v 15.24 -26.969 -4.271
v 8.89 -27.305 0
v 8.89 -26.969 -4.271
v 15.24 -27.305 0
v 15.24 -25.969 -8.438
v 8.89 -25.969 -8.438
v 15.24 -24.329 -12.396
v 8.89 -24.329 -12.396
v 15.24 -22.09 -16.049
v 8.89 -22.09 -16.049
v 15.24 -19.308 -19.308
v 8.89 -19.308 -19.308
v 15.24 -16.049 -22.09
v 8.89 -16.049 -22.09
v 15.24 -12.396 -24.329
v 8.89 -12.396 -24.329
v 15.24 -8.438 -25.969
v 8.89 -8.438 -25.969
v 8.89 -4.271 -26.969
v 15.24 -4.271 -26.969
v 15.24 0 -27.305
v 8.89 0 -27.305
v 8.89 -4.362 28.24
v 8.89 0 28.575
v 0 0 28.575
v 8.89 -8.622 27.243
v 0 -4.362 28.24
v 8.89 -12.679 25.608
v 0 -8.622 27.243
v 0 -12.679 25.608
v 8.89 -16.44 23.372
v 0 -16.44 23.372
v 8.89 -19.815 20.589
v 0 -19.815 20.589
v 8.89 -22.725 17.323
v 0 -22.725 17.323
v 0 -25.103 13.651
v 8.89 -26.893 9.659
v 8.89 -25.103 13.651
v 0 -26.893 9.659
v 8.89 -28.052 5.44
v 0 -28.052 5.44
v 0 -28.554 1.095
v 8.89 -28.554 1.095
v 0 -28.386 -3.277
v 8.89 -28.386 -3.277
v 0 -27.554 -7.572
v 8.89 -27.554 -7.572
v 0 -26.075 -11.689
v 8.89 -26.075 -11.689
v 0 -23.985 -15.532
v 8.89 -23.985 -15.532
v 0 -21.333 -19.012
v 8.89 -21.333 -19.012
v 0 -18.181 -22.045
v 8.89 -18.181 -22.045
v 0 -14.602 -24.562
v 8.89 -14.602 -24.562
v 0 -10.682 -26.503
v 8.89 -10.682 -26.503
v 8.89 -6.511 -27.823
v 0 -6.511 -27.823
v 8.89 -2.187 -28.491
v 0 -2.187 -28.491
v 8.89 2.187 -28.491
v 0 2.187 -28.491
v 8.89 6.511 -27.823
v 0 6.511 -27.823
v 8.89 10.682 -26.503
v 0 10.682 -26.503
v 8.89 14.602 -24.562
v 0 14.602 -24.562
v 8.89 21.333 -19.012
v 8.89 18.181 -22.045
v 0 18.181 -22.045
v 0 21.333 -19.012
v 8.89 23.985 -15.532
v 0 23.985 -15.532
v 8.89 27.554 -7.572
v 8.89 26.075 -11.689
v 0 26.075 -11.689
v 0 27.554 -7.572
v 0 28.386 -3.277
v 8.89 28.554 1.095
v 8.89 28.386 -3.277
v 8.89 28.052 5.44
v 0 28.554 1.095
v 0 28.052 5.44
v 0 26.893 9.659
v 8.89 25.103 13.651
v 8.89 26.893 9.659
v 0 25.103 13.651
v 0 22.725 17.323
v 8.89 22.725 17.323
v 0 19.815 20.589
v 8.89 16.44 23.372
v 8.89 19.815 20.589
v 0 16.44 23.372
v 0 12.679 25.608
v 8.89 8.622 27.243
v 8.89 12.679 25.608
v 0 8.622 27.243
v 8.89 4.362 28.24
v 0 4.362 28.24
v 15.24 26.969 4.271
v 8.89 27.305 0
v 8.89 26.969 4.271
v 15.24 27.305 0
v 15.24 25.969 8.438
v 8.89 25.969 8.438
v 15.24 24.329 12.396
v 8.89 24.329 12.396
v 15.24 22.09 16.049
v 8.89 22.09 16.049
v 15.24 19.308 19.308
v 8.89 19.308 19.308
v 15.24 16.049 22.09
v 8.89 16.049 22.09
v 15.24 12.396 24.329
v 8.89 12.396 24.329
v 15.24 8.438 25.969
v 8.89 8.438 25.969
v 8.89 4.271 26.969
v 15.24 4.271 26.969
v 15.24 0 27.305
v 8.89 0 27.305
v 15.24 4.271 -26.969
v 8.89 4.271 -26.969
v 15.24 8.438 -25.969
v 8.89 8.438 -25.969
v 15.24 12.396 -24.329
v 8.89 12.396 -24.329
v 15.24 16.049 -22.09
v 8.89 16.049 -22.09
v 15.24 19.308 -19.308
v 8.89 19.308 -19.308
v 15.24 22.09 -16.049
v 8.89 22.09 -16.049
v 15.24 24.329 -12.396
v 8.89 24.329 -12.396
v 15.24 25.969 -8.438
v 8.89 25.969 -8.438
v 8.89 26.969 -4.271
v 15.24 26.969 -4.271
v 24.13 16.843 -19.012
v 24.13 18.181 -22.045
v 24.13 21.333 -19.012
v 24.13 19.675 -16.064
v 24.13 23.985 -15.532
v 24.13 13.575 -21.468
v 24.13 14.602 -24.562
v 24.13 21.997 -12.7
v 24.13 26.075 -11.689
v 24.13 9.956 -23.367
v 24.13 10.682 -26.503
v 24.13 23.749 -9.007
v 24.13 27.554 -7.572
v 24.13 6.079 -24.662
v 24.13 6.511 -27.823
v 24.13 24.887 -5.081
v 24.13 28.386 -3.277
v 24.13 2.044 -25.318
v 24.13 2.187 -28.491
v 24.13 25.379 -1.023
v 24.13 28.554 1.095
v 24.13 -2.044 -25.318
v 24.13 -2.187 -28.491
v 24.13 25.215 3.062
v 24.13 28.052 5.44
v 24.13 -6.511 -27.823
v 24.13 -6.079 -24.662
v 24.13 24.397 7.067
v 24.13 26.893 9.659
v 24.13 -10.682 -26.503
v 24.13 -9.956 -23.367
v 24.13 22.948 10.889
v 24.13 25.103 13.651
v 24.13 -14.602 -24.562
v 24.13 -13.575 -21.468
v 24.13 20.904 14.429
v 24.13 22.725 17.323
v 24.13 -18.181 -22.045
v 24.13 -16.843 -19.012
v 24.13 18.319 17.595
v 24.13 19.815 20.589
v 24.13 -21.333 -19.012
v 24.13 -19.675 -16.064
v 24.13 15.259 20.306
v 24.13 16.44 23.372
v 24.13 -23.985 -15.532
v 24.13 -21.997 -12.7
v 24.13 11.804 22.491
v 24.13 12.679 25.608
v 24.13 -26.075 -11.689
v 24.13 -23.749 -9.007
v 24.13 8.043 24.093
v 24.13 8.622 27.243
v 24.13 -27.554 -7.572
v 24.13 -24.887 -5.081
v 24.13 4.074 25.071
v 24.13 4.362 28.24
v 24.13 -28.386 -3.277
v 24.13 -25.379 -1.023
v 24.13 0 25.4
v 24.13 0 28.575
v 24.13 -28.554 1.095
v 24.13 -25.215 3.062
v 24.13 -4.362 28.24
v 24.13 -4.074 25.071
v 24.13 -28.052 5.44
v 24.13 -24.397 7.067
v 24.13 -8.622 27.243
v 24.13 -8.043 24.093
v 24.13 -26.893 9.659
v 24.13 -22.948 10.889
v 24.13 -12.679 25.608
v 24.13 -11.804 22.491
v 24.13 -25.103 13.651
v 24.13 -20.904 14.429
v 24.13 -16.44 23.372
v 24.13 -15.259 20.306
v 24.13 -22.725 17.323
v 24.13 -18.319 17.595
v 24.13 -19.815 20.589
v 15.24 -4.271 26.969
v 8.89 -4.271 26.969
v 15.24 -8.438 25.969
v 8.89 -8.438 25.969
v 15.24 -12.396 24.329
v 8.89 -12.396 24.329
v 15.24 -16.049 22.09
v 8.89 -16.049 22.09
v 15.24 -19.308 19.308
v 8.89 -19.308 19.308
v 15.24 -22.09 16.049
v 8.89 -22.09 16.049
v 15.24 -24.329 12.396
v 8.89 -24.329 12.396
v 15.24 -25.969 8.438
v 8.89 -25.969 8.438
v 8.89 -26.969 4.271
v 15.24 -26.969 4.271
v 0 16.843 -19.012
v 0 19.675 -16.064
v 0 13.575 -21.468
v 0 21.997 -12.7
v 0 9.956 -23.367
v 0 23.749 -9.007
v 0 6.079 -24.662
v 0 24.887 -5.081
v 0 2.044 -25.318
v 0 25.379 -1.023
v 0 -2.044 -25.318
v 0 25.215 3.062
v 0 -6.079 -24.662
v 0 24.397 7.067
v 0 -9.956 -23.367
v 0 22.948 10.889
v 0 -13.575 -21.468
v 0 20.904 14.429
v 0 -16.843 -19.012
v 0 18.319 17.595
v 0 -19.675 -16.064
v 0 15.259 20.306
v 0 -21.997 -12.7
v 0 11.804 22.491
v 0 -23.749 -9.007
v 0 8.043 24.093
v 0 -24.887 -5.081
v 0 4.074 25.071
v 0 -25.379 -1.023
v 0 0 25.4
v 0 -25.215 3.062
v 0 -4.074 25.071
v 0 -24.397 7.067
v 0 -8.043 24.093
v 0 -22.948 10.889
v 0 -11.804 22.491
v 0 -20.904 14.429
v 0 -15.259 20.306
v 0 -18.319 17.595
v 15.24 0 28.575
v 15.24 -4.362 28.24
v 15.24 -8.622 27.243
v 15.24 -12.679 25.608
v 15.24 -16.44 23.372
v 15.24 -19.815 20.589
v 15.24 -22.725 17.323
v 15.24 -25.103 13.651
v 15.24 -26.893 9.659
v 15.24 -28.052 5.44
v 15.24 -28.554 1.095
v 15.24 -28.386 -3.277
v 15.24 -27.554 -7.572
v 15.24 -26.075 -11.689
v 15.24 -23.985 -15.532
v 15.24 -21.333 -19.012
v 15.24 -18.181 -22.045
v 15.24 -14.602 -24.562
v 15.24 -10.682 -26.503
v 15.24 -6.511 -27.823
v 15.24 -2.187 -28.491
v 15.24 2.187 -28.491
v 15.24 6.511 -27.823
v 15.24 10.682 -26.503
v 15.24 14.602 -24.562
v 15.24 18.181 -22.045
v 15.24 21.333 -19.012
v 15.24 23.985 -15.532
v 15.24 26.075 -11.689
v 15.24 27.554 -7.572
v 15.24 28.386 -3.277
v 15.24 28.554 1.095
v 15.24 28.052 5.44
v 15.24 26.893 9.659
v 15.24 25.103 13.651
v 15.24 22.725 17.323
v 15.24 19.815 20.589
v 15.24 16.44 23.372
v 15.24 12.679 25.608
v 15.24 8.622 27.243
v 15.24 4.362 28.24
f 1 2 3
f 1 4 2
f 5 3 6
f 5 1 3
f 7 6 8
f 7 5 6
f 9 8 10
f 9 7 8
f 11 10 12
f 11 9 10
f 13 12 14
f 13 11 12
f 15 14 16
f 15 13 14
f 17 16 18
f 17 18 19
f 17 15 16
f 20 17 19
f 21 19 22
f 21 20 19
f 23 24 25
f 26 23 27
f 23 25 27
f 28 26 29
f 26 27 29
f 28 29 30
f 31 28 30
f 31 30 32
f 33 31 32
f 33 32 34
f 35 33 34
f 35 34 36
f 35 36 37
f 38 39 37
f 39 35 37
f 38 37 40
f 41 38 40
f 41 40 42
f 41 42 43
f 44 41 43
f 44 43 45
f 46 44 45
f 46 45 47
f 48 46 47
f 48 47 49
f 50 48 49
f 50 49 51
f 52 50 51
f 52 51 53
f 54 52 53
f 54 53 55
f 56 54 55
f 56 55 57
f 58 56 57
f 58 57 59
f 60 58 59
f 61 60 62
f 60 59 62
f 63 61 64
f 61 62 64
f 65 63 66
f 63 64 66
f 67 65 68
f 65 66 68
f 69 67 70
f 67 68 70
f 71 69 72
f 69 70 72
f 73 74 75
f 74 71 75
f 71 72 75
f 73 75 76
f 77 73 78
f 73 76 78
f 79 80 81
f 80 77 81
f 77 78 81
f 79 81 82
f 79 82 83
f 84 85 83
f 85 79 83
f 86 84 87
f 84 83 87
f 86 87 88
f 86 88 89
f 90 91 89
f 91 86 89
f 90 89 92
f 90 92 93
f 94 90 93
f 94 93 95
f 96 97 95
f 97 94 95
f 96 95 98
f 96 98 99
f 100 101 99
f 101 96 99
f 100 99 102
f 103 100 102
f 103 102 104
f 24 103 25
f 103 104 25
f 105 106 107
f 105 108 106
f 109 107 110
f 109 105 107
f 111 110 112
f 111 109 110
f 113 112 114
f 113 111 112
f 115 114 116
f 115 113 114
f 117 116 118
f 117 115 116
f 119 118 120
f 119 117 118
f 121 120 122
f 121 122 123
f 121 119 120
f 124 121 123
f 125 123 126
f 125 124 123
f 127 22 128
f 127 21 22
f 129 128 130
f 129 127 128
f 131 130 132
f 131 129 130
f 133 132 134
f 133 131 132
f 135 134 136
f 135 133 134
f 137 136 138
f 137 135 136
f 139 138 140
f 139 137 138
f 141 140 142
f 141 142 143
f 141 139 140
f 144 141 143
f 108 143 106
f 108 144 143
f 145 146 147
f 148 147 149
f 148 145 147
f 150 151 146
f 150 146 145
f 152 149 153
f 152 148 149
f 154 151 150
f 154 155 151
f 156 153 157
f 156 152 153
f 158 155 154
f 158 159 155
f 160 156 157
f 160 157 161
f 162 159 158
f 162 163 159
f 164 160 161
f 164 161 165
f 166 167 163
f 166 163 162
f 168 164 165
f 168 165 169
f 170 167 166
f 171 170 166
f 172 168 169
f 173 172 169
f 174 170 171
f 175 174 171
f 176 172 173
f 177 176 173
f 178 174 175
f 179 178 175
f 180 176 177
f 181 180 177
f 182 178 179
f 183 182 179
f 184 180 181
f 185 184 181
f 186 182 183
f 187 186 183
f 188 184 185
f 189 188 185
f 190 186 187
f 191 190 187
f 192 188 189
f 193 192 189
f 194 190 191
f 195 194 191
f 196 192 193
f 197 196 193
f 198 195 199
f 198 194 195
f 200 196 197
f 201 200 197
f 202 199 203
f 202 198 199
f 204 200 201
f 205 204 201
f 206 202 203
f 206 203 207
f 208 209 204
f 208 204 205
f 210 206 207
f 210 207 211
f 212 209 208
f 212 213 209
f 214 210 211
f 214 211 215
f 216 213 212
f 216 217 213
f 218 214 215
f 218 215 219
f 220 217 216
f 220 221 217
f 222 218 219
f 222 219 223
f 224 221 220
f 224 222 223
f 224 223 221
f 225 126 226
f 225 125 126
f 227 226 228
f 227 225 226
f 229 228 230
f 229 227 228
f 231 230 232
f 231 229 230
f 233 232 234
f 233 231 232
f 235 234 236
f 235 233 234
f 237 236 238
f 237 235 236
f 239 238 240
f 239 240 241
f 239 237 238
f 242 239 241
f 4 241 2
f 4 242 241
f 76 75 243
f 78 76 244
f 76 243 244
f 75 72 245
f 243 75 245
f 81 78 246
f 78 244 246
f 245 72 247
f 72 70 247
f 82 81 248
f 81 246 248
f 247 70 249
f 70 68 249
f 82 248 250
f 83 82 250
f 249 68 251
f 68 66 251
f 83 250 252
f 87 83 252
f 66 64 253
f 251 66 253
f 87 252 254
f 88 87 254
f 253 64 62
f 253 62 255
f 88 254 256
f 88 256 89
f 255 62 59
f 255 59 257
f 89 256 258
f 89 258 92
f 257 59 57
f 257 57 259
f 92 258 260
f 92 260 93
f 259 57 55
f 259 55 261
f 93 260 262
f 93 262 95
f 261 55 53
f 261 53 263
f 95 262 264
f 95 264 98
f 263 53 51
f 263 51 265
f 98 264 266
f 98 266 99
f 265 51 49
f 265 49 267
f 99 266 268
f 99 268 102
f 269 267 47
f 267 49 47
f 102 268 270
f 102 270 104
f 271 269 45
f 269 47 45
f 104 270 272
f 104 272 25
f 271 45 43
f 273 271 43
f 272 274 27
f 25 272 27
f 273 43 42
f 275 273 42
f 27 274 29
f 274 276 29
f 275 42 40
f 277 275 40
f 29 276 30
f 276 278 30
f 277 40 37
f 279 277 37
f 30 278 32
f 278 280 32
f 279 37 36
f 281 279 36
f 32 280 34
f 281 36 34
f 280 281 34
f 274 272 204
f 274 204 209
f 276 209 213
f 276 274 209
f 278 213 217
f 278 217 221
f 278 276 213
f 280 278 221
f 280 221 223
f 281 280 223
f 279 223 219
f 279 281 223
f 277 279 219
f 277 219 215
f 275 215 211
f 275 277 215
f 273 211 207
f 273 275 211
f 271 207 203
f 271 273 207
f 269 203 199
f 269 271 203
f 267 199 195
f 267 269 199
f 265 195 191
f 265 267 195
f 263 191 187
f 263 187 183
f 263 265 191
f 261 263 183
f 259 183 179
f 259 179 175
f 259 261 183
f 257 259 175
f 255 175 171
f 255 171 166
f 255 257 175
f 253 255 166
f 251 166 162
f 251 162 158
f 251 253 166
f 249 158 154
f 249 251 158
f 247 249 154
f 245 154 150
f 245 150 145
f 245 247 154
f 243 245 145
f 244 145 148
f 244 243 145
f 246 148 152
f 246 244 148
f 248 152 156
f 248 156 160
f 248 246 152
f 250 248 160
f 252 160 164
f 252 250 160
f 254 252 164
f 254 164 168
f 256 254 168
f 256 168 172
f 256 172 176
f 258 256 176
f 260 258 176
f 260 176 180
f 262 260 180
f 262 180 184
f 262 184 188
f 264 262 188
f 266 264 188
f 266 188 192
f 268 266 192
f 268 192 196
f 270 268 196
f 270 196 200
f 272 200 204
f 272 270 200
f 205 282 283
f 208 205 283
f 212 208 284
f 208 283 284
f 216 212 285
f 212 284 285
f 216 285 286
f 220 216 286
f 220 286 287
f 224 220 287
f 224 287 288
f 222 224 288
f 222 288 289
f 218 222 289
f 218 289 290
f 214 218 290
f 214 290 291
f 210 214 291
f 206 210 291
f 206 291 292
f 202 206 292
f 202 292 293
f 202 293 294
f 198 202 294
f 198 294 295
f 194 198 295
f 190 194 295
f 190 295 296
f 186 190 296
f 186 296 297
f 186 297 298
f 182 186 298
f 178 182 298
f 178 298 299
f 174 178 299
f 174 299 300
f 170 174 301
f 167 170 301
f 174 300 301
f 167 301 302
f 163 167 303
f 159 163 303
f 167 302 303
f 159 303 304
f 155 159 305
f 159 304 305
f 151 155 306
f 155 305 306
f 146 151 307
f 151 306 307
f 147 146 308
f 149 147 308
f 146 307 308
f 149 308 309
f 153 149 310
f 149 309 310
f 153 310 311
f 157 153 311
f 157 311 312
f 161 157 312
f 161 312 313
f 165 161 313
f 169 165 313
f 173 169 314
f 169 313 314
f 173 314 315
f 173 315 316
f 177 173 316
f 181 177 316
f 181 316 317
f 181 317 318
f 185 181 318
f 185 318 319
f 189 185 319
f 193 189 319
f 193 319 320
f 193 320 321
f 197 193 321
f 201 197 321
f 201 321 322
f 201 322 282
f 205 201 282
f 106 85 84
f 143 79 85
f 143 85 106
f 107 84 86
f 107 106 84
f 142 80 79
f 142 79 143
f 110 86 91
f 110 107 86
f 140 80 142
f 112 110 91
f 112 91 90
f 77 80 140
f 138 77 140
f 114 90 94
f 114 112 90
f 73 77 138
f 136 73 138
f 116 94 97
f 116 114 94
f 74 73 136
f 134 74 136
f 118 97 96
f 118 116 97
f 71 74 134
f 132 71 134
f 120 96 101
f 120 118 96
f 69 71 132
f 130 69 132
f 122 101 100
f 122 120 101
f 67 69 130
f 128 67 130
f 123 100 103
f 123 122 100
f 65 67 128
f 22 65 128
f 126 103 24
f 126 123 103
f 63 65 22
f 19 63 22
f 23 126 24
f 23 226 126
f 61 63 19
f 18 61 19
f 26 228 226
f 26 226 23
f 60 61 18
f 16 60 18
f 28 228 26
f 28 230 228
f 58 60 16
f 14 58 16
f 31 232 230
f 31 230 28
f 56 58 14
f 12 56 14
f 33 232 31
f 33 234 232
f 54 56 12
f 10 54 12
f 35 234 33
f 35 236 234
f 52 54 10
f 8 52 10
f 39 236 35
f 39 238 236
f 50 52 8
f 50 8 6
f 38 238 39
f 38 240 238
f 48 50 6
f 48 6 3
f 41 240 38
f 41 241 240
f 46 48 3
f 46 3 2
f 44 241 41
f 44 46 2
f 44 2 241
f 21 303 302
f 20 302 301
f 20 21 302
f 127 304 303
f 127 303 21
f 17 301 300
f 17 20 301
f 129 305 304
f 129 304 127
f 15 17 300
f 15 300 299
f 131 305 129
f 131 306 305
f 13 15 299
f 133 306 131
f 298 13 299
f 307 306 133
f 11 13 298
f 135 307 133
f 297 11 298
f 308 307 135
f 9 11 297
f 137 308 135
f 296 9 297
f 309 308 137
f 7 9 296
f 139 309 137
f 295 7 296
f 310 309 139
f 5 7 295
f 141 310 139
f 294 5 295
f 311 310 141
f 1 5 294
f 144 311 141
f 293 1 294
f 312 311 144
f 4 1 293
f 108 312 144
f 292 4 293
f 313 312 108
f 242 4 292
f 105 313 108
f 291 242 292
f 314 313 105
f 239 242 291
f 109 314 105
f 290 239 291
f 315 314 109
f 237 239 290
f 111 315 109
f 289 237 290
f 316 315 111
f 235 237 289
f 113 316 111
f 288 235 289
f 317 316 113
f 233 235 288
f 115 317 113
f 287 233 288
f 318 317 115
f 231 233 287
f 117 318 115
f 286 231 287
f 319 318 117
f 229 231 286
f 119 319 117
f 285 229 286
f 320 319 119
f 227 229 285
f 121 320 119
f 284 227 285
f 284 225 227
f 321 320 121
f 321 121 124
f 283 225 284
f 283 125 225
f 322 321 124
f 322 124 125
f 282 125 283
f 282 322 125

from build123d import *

# Parameters (mm, degrees)
SKETCH1_R           = 28.575
SKETCH1_R_2         = 25.4
BOSS_EXTRUDE1_DEPTH = 24.13


with BuildPart() as part:
    # Sketch1 → Boss-Extrude1 (new body)
    with BuildSketch(Plane(origin=(0, 0, 0), x_dir=(0, 0, -1), z_dir=(1, 0, 0))):
        with Locations(Location((0, 0, 0), (0, 0, 180))):
            Circle(SKETCH1_R)
        with Locations(Location((0, 0, 0), (0, 0, 180))):
            Circle(SKETCH1_R_2, mode=Mode.SUBTRACT)
    extrude(amount=BOSS_EXTRUDE1_DEPTH)

    # Cut-Sweep1: sweep along a curve in space
    with BuildLine() as cut_sweep1_path:
        ThreePointArc((24.13, 0, -28.575), (24.13, 20.205576272, -20.205576272), (24.13, 28.575, 0))
        ThreePointArc((24.13, 28.575, 0), (24.13, 20.205576272, 20.205576272), (24.13, 0, 28.575))
        ThreePointArc((24.13, 0, 28.575), (24.13, -20.205576272, 20.205576272), (24.13, -28.575, 0))
        ThreePointArc((24.13, -28.575, 0), (24.13, -20.205576272, -20.205576272), (24.13, 0, -28.575))
    # Sketch2 → Cut-Sweep1 (sweep, cut)
    with BuildSketch(Plane.XY):
        Polygon((15.24, 28.575), (15.24, 27.305), (8.89, 27.305), (8.89, 28.575), (8.89, 30.628551977), (15.24, 30.628551977), align=None)
    sweep(path=cut_sweep1_path.line, mode=Mode.SUBTRACT)


solid = part.part
